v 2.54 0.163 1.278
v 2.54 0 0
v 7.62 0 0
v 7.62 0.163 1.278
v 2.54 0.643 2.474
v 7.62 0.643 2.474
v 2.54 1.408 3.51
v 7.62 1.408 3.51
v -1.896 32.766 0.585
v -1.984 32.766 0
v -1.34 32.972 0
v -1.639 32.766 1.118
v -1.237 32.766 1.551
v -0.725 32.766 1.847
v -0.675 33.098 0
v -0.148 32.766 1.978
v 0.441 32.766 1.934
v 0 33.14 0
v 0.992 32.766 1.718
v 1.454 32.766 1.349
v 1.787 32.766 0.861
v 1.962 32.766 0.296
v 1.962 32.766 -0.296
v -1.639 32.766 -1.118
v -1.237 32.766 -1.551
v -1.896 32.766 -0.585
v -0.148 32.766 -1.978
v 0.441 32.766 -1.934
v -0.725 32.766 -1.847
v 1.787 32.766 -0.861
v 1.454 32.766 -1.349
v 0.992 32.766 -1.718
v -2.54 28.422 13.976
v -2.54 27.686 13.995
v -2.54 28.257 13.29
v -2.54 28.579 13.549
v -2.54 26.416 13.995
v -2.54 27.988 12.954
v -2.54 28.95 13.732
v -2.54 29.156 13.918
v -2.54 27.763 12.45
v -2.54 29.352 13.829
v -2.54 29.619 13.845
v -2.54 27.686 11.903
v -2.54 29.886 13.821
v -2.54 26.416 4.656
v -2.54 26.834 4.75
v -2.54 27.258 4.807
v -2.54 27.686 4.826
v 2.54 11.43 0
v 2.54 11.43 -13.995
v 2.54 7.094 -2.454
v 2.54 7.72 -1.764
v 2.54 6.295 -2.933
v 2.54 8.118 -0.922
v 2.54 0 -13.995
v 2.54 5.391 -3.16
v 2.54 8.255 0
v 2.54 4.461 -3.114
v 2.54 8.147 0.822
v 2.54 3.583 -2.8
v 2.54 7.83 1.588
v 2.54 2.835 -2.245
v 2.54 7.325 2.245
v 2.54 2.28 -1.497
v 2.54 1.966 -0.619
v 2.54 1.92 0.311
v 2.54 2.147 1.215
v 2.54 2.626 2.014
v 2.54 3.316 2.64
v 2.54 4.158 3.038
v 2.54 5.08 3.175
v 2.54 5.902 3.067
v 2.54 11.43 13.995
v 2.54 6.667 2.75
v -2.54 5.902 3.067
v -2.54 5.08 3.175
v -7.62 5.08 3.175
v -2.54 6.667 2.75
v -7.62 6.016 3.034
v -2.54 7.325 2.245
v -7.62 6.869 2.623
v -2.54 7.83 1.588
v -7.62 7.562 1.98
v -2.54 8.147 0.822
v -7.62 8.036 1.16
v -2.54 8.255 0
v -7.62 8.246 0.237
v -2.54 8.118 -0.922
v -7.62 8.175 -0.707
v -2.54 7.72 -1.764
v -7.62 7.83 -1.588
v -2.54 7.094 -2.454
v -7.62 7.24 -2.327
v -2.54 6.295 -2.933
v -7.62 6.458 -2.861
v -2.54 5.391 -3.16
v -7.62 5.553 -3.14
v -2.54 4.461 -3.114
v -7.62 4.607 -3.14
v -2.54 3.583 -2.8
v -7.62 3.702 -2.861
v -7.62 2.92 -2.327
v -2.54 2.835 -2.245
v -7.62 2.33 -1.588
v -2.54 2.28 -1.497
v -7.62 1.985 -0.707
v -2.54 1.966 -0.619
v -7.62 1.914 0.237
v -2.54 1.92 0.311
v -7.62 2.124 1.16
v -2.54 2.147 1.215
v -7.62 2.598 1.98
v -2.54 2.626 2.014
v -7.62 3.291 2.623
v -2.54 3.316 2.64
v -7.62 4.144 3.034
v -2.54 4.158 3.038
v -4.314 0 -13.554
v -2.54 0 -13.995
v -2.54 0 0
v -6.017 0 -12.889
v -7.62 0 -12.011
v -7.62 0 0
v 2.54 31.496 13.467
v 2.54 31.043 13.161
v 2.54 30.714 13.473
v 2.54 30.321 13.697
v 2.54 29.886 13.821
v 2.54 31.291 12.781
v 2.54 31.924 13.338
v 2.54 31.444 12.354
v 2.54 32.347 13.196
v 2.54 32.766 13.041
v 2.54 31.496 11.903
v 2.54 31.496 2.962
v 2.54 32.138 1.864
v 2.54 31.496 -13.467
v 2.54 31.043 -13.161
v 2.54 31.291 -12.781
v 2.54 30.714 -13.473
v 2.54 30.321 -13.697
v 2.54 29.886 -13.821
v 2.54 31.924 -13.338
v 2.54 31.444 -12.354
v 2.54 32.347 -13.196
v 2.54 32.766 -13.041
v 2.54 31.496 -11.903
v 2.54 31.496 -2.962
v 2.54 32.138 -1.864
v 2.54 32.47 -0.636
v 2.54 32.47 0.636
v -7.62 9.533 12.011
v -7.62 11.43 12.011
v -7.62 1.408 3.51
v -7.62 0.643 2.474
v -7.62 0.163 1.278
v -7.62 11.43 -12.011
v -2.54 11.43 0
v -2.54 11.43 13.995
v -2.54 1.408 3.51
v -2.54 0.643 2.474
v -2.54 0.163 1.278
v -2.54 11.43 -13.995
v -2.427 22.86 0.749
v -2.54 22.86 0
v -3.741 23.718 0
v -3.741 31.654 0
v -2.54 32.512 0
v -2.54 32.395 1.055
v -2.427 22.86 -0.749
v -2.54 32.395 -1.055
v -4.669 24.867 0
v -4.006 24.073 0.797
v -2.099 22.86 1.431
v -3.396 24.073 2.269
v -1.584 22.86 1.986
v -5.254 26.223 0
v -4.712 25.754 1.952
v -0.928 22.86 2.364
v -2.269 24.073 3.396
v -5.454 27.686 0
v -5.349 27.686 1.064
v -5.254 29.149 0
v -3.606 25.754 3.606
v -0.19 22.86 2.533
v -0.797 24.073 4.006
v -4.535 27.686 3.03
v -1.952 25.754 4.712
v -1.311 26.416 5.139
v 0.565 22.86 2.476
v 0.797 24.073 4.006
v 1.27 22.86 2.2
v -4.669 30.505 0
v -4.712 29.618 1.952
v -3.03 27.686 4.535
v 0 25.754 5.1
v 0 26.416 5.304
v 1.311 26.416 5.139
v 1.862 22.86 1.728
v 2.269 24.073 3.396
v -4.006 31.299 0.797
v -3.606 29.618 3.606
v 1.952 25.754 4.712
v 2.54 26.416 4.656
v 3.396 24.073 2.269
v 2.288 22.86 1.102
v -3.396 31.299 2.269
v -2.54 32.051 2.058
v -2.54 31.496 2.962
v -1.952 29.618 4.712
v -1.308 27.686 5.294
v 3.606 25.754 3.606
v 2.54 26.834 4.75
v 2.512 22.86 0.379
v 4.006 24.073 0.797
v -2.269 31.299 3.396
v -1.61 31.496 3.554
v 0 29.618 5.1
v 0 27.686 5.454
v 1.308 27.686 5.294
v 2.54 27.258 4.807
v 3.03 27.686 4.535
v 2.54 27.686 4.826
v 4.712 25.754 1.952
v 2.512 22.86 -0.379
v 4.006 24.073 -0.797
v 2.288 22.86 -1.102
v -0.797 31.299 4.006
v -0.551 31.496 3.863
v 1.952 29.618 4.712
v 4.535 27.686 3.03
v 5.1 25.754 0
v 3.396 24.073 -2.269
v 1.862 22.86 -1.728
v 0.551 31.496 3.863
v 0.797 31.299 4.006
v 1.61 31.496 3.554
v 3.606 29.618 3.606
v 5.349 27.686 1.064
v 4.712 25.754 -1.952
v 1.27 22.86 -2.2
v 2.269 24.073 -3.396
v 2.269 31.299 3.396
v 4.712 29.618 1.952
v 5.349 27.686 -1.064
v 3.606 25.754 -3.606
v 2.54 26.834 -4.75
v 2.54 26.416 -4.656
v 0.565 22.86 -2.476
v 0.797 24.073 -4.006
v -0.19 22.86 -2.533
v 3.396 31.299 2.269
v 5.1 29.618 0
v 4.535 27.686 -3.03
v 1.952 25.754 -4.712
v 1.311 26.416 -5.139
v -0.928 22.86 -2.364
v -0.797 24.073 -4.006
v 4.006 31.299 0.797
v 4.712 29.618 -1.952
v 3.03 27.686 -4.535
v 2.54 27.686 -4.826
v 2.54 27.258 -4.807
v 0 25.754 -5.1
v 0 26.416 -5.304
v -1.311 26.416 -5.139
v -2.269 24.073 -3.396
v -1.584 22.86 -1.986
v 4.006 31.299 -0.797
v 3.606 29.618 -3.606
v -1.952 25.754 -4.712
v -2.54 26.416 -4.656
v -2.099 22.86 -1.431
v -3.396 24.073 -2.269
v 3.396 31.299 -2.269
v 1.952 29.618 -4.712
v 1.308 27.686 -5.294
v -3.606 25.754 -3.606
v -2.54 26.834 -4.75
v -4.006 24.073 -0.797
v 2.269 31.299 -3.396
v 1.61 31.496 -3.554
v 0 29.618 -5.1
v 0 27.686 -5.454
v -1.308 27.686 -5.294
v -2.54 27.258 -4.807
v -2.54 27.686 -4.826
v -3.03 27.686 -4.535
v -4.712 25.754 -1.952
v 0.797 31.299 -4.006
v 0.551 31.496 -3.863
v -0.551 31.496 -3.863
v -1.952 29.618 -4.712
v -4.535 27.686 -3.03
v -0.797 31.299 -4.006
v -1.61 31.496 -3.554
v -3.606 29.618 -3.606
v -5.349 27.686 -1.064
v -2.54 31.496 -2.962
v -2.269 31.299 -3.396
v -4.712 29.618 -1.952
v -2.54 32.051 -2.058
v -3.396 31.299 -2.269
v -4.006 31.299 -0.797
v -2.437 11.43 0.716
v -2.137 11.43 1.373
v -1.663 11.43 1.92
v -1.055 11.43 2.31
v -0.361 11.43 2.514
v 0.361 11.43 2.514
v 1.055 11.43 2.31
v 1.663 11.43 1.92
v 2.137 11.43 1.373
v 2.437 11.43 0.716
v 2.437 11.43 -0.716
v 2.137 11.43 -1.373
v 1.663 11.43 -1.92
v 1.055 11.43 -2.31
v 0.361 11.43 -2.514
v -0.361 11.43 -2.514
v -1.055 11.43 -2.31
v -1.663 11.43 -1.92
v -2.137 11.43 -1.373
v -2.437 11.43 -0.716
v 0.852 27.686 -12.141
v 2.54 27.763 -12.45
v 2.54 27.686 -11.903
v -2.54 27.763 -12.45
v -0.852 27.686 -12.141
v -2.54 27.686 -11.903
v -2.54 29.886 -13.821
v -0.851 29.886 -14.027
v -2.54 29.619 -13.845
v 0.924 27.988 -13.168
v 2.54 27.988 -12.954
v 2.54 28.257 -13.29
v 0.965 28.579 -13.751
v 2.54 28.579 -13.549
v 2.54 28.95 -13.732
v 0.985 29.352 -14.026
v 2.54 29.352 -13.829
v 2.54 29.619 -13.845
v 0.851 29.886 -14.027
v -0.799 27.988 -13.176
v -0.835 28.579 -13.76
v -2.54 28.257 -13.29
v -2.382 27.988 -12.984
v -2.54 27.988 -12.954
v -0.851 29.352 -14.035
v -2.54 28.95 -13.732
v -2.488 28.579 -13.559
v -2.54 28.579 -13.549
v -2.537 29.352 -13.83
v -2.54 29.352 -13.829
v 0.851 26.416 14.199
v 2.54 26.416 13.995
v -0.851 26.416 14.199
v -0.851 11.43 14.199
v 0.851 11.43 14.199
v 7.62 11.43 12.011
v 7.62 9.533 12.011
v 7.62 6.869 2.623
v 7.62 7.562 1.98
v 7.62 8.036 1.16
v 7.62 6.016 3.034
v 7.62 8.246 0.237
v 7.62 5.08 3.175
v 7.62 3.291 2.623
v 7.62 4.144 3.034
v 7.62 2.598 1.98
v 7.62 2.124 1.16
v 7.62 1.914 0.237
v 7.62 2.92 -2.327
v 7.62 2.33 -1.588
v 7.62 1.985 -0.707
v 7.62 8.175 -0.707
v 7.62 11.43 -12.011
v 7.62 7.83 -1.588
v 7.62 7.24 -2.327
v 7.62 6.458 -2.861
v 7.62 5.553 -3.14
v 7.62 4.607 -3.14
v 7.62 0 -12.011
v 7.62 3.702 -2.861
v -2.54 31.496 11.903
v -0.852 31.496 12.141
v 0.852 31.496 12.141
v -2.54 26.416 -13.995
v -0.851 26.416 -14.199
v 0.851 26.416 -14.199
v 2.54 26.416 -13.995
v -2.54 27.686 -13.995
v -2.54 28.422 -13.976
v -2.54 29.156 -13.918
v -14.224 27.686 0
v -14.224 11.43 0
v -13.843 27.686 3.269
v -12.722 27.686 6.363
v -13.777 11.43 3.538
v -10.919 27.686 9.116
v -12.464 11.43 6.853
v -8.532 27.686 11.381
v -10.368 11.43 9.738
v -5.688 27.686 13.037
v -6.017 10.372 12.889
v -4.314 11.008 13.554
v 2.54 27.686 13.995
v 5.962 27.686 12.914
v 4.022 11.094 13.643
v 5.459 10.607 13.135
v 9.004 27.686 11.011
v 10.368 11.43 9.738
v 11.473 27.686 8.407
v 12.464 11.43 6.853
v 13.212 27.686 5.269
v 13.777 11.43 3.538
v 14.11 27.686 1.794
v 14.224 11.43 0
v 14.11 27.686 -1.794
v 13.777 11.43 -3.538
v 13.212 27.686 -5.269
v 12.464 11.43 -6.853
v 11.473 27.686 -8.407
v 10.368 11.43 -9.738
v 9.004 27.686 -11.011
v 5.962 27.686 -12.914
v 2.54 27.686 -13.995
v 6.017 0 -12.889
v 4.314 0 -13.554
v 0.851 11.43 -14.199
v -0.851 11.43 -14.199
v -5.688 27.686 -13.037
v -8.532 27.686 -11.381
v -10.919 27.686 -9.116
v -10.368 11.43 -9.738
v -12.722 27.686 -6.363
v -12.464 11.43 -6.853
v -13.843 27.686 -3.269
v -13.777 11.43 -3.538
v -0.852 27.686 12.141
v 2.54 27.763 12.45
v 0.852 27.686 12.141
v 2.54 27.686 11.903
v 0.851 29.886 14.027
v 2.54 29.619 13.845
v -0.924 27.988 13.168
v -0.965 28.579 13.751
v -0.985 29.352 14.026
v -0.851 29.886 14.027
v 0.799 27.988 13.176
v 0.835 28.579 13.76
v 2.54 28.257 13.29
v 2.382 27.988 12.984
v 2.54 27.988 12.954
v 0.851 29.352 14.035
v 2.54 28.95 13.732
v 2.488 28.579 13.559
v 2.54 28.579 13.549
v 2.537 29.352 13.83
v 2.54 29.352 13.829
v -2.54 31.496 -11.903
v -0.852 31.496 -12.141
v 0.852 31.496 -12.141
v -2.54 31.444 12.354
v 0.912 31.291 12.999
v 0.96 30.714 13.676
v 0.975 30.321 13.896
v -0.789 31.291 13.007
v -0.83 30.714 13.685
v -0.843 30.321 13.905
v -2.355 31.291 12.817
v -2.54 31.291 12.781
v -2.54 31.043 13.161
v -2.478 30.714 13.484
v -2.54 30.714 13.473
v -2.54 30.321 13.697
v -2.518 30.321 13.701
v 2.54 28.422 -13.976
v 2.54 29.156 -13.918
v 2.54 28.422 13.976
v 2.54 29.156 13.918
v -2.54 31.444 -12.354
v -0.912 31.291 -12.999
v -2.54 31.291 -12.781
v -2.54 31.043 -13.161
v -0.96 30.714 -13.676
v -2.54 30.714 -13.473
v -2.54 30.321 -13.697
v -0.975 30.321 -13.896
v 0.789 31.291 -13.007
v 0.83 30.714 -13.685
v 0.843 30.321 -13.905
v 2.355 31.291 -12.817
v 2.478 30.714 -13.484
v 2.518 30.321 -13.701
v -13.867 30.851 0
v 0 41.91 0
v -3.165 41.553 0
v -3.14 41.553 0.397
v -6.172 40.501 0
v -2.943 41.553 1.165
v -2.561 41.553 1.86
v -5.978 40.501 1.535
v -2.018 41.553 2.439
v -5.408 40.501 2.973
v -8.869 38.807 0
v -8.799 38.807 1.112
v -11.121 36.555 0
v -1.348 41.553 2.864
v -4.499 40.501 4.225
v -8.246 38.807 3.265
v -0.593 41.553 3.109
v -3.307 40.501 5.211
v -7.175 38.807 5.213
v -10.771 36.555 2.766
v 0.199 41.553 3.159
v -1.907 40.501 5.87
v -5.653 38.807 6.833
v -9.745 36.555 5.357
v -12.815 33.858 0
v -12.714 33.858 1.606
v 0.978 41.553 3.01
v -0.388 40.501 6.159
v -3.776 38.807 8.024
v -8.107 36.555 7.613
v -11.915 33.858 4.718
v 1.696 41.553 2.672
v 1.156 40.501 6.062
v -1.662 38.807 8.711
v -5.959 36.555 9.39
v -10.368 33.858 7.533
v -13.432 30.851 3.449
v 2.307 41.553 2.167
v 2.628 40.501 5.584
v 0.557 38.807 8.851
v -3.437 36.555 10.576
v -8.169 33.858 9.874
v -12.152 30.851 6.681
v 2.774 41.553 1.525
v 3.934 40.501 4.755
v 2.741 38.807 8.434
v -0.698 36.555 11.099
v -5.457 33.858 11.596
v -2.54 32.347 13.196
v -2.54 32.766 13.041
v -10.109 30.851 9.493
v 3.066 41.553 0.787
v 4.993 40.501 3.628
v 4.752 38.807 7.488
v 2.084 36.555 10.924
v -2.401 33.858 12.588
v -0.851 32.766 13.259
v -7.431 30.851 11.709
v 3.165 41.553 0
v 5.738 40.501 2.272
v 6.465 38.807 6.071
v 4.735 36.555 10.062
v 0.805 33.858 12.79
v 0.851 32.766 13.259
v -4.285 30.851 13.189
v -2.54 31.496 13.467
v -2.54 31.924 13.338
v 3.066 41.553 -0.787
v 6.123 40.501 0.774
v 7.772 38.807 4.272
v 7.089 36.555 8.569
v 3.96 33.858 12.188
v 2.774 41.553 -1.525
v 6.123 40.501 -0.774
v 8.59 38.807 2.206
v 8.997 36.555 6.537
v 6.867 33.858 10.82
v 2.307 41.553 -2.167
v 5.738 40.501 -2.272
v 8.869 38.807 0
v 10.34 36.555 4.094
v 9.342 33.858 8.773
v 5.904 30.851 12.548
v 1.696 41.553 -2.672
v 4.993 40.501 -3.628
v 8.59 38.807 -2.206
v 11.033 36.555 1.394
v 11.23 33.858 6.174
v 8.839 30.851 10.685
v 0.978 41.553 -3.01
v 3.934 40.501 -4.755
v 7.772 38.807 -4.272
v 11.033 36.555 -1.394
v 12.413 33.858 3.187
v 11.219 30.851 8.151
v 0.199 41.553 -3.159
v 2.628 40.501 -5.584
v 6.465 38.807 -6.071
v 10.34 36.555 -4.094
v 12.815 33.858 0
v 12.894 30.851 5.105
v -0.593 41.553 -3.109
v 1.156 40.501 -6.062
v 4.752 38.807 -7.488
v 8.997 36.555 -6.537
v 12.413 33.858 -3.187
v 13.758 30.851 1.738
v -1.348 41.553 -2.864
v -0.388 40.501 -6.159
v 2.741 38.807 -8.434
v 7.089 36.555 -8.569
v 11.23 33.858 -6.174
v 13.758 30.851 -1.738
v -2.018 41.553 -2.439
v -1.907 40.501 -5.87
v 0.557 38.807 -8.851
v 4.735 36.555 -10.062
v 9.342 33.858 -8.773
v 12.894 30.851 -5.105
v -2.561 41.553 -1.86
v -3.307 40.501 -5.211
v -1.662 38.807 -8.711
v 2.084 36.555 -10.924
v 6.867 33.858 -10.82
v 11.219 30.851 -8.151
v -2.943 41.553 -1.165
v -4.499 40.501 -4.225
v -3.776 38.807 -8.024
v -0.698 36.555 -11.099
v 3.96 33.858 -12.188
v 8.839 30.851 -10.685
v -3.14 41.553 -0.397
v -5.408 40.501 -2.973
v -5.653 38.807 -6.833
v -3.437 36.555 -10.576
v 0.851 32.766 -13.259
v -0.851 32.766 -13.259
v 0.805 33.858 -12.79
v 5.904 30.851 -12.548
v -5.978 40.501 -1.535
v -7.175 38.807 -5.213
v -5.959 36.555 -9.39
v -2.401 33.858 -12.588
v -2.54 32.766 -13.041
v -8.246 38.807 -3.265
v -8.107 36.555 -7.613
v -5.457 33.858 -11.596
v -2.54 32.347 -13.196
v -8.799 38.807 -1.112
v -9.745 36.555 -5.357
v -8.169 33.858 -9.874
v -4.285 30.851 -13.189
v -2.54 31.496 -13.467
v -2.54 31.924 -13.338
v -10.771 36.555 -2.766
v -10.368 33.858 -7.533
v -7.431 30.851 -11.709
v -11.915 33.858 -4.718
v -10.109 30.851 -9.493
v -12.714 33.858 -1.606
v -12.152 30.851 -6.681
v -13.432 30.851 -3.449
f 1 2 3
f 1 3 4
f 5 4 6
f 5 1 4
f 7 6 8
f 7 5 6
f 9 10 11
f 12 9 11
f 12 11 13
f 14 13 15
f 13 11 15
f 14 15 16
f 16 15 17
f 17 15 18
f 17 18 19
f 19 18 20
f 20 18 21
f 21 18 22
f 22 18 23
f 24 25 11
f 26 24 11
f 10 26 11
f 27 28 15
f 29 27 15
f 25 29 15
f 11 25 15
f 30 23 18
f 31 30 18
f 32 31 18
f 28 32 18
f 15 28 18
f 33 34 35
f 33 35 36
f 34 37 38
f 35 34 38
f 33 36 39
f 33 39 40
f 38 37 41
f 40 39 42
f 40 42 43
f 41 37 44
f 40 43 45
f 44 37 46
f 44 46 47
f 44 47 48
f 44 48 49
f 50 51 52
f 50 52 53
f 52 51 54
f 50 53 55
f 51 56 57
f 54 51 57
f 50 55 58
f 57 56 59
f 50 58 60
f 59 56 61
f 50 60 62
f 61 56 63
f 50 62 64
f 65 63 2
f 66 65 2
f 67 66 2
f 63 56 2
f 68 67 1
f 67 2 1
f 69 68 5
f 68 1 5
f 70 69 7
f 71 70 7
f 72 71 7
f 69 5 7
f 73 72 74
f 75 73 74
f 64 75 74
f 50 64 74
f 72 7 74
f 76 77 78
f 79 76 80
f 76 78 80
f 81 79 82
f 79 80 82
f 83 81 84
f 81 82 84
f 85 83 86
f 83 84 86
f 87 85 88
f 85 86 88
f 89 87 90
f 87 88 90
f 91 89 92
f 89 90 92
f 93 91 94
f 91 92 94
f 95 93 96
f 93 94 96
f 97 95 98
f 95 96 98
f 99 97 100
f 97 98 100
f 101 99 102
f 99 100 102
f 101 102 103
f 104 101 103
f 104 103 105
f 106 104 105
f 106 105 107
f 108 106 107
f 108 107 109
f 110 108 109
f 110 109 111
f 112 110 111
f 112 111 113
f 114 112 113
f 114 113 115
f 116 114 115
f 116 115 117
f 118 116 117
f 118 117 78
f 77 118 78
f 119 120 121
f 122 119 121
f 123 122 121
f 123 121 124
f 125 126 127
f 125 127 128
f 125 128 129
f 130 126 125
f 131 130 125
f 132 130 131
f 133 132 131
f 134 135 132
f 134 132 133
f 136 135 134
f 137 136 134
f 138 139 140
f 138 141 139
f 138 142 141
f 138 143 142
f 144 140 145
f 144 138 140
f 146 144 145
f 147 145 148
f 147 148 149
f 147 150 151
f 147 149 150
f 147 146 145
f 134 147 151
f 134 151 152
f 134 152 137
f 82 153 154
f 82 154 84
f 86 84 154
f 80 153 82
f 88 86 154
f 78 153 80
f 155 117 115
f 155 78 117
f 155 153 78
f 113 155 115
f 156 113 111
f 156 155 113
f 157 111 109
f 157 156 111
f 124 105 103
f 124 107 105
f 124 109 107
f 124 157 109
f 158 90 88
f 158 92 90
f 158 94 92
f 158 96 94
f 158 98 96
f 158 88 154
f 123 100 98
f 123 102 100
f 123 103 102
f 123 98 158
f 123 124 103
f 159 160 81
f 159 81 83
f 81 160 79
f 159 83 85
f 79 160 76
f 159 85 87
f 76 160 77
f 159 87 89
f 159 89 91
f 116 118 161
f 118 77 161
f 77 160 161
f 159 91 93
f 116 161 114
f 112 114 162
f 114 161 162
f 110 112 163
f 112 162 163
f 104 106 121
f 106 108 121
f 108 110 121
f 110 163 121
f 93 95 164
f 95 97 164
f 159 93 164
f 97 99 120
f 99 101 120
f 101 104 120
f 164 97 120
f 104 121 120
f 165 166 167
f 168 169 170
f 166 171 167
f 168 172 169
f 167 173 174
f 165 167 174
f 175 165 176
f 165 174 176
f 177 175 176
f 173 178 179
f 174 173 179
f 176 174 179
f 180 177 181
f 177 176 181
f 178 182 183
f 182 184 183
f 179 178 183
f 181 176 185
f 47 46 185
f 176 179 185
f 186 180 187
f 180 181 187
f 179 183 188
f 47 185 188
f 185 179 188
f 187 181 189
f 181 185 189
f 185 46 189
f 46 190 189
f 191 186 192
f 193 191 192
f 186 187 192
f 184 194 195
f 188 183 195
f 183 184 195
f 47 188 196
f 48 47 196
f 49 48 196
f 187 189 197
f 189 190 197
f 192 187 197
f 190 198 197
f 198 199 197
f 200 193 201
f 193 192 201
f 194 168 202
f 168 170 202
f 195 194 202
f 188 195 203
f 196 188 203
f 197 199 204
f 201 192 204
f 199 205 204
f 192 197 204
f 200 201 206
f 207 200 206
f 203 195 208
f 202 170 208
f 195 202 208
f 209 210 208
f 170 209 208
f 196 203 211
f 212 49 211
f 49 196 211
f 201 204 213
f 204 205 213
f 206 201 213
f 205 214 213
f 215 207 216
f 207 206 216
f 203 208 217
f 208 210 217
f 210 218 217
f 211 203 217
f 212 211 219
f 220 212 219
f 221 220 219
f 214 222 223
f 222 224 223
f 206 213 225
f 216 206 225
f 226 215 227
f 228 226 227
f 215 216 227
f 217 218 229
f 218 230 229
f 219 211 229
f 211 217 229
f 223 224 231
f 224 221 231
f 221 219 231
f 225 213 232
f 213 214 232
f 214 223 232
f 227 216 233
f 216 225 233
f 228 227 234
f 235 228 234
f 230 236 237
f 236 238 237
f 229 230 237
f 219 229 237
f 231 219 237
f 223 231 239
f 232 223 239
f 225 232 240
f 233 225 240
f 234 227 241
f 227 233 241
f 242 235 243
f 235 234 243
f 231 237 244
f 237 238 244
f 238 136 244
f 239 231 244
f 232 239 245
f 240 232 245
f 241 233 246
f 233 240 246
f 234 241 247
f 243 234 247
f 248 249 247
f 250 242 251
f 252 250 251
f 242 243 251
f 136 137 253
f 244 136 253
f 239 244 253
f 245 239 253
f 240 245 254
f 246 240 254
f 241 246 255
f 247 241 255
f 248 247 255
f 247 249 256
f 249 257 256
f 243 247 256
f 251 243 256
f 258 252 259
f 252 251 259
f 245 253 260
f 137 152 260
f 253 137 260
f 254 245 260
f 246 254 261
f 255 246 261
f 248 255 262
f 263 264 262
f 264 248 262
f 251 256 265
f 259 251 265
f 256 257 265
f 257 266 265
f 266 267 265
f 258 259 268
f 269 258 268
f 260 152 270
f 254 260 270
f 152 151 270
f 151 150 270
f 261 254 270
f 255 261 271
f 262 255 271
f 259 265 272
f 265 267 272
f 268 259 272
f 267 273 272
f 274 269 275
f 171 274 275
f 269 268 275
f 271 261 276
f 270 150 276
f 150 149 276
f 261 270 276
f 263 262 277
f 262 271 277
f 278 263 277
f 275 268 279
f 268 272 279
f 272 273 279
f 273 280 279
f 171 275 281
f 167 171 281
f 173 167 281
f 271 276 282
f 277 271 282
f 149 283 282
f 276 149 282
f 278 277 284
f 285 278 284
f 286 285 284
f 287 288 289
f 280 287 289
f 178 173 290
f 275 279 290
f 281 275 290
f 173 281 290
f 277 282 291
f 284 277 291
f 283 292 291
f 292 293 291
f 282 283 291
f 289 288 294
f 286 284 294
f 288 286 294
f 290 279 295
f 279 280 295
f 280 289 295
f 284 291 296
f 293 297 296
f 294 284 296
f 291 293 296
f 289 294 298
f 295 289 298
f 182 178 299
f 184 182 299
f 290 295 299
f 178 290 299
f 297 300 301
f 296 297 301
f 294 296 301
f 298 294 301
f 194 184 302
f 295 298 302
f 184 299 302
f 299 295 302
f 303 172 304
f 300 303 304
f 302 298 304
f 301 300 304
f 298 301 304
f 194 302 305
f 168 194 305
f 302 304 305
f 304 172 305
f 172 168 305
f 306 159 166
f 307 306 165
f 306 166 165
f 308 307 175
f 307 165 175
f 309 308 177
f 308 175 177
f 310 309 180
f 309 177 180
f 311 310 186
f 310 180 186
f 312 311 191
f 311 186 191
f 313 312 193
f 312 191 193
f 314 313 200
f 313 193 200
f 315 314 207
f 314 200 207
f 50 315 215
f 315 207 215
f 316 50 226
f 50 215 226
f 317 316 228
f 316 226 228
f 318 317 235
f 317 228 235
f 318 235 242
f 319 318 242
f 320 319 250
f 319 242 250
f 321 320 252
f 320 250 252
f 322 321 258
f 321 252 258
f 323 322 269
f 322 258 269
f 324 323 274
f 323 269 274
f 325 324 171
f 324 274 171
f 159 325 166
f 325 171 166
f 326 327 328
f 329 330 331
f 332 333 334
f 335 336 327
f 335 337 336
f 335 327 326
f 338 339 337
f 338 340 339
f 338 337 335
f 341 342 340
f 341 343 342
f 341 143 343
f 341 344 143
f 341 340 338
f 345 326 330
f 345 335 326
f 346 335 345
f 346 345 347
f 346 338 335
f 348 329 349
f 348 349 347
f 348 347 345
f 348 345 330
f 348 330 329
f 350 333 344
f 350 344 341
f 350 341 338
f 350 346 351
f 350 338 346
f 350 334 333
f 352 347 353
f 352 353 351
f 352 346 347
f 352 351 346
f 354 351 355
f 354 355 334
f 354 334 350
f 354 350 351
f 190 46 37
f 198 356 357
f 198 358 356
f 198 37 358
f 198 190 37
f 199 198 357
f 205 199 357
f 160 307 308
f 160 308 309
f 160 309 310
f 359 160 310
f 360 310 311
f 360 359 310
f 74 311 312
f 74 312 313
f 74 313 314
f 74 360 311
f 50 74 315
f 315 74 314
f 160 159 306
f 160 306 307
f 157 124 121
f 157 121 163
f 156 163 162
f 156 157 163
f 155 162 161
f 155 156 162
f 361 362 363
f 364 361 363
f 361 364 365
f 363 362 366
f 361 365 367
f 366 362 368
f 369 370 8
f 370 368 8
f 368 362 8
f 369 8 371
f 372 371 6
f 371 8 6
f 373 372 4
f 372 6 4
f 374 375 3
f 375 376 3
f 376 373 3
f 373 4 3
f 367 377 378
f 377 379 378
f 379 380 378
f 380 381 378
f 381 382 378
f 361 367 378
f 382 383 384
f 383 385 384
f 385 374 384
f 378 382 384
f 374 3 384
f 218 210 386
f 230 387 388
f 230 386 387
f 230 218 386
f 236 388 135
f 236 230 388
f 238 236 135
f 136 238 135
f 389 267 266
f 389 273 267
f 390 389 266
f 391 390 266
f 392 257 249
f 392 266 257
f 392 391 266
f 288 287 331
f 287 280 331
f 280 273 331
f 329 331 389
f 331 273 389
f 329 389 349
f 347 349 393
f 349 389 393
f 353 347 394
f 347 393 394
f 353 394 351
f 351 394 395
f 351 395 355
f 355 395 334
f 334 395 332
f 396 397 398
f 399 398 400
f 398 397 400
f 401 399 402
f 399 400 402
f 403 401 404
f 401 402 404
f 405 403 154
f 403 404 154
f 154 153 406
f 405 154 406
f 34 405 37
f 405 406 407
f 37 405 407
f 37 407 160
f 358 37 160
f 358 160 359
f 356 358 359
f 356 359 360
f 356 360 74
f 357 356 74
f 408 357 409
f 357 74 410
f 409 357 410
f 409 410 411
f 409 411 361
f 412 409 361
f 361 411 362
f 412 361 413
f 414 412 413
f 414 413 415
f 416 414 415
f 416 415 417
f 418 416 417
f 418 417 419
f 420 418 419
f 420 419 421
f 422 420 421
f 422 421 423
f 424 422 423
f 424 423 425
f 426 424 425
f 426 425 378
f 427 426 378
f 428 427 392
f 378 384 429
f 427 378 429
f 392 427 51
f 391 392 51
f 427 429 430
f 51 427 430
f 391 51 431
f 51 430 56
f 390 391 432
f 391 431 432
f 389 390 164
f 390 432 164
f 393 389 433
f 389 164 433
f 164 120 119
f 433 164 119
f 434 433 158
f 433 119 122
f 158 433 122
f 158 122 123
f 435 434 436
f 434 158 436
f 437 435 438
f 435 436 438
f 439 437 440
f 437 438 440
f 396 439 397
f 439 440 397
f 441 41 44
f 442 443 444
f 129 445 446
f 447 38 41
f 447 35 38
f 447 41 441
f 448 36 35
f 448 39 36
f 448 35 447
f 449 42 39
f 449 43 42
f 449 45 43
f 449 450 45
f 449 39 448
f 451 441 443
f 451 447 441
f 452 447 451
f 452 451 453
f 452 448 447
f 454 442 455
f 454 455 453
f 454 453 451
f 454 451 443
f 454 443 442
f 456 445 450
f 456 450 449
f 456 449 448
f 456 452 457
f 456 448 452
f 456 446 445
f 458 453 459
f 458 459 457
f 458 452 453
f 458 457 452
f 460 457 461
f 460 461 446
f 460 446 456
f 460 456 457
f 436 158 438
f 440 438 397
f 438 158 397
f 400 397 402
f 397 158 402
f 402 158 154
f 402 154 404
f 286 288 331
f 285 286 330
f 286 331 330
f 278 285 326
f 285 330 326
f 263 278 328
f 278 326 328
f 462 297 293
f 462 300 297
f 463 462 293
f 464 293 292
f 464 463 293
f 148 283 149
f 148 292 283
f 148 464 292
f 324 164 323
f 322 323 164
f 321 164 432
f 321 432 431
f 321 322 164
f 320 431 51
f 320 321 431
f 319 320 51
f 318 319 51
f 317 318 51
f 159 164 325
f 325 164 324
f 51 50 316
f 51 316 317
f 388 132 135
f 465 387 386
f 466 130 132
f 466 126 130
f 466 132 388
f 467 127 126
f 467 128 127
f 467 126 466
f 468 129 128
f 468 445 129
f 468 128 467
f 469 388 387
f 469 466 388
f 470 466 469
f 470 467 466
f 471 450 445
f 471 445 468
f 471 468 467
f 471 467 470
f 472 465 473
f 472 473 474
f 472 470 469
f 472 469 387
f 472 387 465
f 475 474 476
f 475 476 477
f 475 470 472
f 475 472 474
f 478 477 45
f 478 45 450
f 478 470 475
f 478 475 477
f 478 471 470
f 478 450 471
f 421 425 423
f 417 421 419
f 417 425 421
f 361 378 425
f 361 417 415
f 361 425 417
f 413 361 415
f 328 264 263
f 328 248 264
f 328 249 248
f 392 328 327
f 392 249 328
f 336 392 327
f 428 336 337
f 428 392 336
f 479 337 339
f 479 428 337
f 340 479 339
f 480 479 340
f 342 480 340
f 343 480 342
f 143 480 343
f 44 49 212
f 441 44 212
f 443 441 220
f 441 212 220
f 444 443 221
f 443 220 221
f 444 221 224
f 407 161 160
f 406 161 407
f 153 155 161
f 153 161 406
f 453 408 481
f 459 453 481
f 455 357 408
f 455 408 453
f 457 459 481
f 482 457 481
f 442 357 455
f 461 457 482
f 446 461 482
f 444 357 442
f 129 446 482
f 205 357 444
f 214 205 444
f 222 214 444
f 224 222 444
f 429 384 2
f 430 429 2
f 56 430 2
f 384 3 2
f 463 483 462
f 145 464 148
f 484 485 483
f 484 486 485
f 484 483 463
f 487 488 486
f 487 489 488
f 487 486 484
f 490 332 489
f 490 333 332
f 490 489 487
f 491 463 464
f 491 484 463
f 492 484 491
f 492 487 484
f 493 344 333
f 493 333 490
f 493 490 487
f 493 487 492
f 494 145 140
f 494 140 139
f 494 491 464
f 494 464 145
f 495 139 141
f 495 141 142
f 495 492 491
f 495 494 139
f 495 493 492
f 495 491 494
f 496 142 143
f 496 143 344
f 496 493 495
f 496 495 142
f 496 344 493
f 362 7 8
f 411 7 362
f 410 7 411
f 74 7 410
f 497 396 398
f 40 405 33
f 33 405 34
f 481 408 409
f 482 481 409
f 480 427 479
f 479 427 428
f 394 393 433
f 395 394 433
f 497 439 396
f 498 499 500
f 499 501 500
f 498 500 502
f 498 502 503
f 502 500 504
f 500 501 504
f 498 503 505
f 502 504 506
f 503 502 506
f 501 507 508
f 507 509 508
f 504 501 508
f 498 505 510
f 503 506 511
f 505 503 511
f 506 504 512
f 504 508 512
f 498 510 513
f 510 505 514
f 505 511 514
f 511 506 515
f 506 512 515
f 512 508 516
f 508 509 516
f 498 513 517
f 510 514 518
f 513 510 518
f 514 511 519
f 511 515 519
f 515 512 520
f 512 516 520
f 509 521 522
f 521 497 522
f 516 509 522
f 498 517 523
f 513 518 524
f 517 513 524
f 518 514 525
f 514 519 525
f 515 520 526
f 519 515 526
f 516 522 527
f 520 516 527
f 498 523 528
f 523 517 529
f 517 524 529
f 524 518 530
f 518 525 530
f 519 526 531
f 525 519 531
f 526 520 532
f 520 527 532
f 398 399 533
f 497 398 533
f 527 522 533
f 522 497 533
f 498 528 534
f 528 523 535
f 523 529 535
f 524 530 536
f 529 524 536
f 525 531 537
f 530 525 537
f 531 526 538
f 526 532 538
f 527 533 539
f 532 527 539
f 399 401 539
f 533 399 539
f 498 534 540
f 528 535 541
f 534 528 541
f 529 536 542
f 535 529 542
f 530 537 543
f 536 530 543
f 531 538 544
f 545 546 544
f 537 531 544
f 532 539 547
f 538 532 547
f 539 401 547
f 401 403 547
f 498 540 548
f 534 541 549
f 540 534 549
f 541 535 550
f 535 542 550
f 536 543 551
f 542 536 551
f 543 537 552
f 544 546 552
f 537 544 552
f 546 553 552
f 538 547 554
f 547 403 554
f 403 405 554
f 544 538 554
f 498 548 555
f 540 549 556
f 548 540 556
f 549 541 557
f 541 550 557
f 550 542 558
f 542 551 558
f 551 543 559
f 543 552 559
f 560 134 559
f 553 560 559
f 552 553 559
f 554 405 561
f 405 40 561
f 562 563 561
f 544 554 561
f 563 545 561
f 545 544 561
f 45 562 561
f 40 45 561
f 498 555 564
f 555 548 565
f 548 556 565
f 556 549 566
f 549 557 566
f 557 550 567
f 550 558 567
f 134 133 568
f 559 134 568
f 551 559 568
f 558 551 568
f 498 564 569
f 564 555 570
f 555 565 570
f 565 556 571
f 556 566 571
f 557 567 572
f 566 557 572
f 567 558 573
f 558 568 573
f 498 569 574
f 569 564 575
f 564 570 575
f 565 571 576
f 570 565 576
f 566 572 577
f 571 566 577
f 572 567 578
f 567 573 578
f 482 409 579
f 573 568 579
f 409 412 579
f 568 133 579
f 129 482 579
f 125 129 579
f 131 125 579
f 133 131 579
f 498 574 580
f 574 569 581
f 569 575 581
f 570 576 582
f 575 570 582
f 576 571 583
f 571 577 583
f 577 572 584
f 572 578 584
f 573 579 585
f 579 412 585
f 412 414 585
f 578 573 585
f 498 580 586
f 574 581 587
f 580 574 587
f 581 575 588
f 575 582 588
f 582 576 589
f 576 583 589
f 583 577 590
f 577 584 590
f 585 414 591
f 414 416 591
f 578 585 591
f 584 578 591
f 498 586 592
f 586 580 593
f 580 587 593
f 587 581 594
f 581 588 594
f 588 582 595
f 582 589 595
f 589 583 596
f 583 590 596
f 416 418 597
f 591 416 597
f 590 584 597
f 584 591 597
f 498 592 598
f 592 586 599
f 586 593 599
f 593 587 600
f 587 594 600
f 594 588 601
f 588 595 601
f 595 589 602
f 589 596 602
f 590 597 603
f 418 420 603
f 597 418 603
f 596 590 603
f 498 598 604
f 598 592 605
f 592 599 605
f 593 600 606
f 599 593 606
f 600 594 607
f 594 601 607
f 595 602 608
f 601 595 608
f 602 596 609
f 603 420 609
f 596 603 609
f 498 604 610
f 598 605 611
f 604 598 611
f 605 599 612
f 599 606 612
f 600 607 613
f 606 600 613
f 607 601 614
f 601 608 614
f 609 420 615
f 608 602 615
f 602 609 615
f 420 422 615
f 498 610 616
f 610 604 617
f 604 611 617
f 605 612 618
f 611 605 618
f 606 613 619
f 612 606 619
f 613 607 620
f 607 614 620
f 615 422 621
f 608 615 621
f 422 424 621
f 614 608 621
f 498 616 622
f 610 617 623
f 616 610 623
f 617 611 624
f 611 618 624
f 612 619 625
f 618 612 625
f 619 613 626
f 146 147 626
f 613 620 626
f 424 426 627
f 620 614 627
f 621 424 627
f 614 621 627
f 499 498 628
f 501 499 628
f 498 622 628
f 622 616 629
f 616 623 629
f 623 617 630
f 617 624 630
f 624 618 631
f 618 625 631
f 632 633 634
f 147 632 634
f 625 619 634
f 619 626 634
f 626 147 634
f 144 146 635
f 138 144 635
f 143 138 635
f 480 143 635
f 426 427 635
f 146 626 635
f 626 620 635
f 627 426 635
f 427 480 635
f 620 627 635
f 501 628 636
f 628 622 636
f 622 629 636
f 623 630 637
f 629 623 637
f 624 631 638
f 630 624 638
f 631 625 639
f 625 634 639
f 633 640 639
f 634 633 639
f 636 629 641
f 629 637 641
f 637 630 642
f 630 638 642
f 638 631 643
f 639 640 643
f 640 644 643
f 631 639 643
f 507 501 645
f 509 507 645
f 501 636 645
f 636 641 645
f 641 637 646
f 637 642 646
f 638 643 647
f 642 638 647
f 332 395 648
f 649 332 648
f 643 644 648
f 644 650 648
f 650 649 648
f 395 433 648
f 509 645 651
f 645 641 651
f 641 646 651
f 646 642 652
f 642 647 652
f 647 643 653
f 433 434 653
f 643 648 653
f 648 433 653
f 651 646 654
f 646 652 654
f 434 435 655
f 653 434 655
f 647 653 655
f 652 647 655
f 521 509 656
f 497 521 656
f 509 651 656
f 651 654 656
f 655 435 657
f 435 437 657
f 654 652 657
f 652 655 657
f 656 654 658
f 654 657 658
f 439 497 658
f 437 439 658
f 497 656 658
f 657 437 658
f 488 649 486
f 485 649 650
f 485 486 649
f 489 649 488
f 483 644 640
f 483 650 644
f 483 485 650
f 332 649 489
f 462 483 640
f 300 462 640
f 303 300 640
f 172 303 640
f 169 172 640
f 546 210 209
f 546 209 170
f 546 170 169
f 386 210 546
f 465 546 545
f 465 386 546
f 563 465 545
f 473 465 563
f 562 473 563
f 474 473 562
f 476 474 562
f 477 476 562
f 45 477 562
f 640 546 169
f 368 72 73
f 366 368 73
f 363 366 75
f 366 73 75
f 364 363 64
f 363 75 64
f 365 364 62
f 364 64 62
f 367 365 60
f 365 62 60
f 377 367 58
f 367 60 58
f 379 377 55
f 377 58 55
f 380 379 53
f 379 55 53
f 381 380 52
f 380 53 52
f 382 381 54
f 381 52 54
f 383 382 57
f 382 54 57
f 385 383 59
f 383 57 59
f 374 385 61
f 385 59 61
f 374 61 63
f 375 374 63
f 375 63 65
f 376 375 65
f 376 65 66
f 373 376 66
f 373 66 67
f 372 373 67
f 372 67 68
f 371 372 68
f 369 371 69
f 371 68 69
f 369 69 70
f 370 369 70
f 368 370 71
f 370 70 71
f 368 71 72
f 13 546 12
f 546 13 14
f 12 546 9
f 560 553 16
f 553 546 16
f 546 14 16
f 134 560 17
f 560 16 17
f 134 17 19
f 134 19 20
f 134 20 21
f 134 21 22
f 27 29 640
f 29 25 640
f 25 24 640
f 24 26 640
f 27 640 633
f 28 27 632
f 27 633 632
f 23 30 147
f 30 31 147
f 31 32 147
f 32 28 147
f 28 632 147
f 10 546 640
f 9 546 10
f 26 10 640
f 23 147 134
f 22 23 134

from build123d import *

# Parameters (mm, degrees)
CUT_EXTRUDE1_DEPTH      = 11.43
SKETCH3_R               = 3.175
CUT_EXTRUDE2_DEPTH      = 50.355147776
CUT_EXTRUDE3_DEPTH      = 47.487551581
CUT_EXTRUDE3_DEPTH_BACK = 47.487551581
SKETCH4_W               = 5.08
SKETCH4_H               = 1.27
FILLET1_R               = 1.905


with BuildPart() as part:
    # Sketch1 → Revolve1 (revolve)
    with BuildSketch(Plane.XY):
        with BuildLine():
            Line((0, 0), (0, 5.602635041))
            Line((0, 5.602635041), (-2.54, 5.602635041))
            Line((-2.54, 5.602635041), (-2.54, 22.86))
            ThreePointArc((-2.54, 22.86), (-5.294384008, 28.994194932), (0, 33.139611281))
            Line((0, 33.139611281), (0, 41.91))
            ThreePointArc((0, 41.91), (-10.057886856, 37.743886856), (-14.224, 27.686))
            Line((-14.224, 27.686), (-14.224, 0))
            Line((-14.224, 0), (0, 0))
        make_face()
    revolve(axis=Axis((0, 0, 0), (0, 1, 0)))

    # Sketch2 → Cut-Extrude1 (cut)
    with BuildSketch(Plane.XZ):
        with BuildLine():
            Line((-2.54, 13.995376951), (-2.54, -13.995376951))
            ThreePointArc((-2.54, -13.995376951), (0, -14.224), (2.54, -13.995376951))
            Line((2.54, -13.995376951), (2.54, 13.995376951))
            ThreePointArc((2.54, 13.995376951), (0, 14.224), (-2.54, 13.995376951))
        make_face()
        with BuildLine():
            Line((-7.62, 12.010735864), (-7.62, -12.010735864))
            ThreePointArc((-7.62, -12.010735864), (-14.224, 0), (-7.62, 12.010735864))
        make_face()
        with BuildLine():
            Line((7.62, 12.010735864), (7.62, -12.010735864))
            ThreePointArc((7.62, -12.010735864), (14.224, 0), (7.62, 12.010735864))
        make_face()
    extrude(amount=-CUT_EXTRUDE1_DEPTH, mode=Mode.SUBTRACT)

    # Sketch3 → Cut-Extrude2 (cut, through all)
    with BuildSketch(Plane.ZY.offset(7.62)):
        with Locations((0, 5.08)):
            Circle(SKETCH3_R)
        with BuildLine():
            Line((3.510108408, 1.40773381), (13.995376951, 11.43))
            Line((13.995376951, 11.43), (13.995376951, 0))
            Line((13.995376951, 0), (0, 0))
            ThreePointArc((0, 0), (1.890937302, 0.365049722), (3.510108408, 1.40773381))
        make_face()
    extrude(amount=-CUT_EXTRUDE2_DEPTH, mode=Mode.SUBTRACT)

    # Sketch4 → Cut-Extrude3 (cut, two sides: drawn at the far end of the back side and taken through both)
    with BuildSketch(Plane.XY.offset(-CUT_EXTRUDE3_DEPTH_BACK)):
        with Locations((0, 27.051)):
            Rectangle(SKETCH4_W, SKETCH4_H)
        with Locations((0, 32.131)):
            Rectangle(SKETCH4_W, SKETCH4_H)
    extrude(amount=CUT_EXTRUDE3_DEPTH + CUT_EXTRUDE3_DEPTH_BACK, mode=Mode.SUBTRACT)

    # Fillet1
    # the kernel refuses this fillet: 1.905 mm, written as the material it takes off along each edge
    with BuildSketch(Plane(origin=(0, 27.686, 0), x_dir=(-0.5373639456593198, 0, 0.8433504549743527), z_dir=(-0.8433504549743527, 0, -0.5373639456593198))) as fillet1_piece_1_section:
        with BuildLine():
            CenterArc((12.170814928, 1.905), FILLET1_R, 270, 98.895870208)
            Line((12.170814928, 0), (14.224, 0))
            ThreePointArc((14.224, 0), (14.181160416, 1.10311616), (14.05289971, 2.199587629))
        make_face()
    fillet1_piece_1 = revolve(axis=Axis((0, 27.686, 0), (0, 1, 0)), revolution_arc=65.00874172, mode=Mode.PRIVATE)
    fillet1_piece_1 = split(fillet1_piece_1, bisect_by=Plane(origin=(2.54, 28.192059722, 13.665836287), z_dir=(-1, 0, 0)), keep=Keep.TOP, mode=Mode.PRIVATE)
    fillet1_piece_1 = split(fillet1_piece_1, bisect_by=Plane(origin=(-2.54, 28.192059722, 13.665836287), z_dir=(1, 0, 0)), keep=Keep.TOP, mode=Mode.PRIVATE)
    add(fillet1_piece_1, mode=Mode.SUBTRACT)
    with BuildSketch(Plane(origin=(0, 31.496, 0), x_dir=(0.46799048823775274, 0, 0.883733502204703), z_dir=(0.883733502204703, 0, -0.46799048823775274))) as fillet1_piece_2_section:
        with BuildLine():
            CenterArc((12.170814928, 1.905), FILLET1_R, 270, 81.104129792)
            Line((12.170814928, 0), (13.704235696, 0))
            ThreePointArc((13.704235696, 0), (13.90190629, 0.80015324), (14.05289971, 1.610412371))
        make_face()
    fillet1_piece_2 = revolve(axis=Axis((0, 31.496, 0), (0, -1, 0)), revolution_arc=55.807867303, mode=Mode.PRIVATE)
    fillet1_piece_2 = split(fillet1_piece_2, bisect_by=Plane(origin=(-2.54, 31.138166145, 13.379180575), z_dir=(1, 0, 0)), keep=Keep.TOP, mode=Mode.PRIVATE)
    fillet1_piece_2 = split(fillet1_piece_2, bisect_by=Plane(origin=(2.54, 31.138166145, 13.379180575), z_dir=(-1, 0, 0)), keep=Keep.TOP, mode=Mode.PRIVATE)
    add(fillet1_piece_2, mode=Mode.SUBTRACT)
    with BuildSketch(Plane(origin=(0, 31.496, 0), x_dir=(-0.4679904882377507, 0, -0.883733502204704), z_dir=(-0.883733502204704, 0, 0.4679904882377507))) as fillet1_piece_3_section:
        with BuildLine():
            CenterArc((12.170814928, 1.905), FILLET1_R, 270, 81.104129792)
            Line((12.170814928, 0), (13.704235696, 0))
            ThreePointArc((13.704235696, 0), (13.90190629, 0.80015324), (14.05289971, 1.610412371))
        make_face()
    fillet1_piece_3 = revolve(axis=Axis((0, 31.496, 0), (0, -1, 0)), revolution_arc=55.807867303, mode=Mode.PRIVATE)
    fillet1_piece_3 = split(fillet1_piece_3, bisect_by=Plane(origin=(-2.54, 31.138166145, -13.379180575), z_dir=(1, 0, 0)), keep=Keep.TOP, mode=Mode.PRIVATE)
    fillet1_piece_3 = split(fillet1_piece_3, bisect_by=Plane(origin=(2.54, 31.138166145, -13.379180575), z_dir=(-1, 0, 0)), keep=Keep.TOP, mode=Mode.PRIVATE)
    add(fillet1_piece_3, mode=Mode.SUBTRACT)
    with BuildSketch(Plane(origin=(0, 27.686, 0), x_dir=(0.5373639456593708, 0, -0.84335045497432), z_dir=(0.84335045497432, 0, 0.5373639456593708))) as fillet1_piece_4_section:
        with BuildLine():
            CenterArc((12.170814928, 1.905), FILLET1_R, 270, 98.895870208)
            Line((12.170814928, 0), (14.224, 0))
            ThreePointArc((14.224, 0), (14.181160416, 1.10311616), (14.05289971, 2.199587629))
        make_face()
    fillet1_piece_4 = revolve(axis=Axis((0, 27.686, 0), (0, 1, 0)), revolution_arc=65.00874172, mode=Mode.PRIVATE)
    fillet1_piece_4 = split(fillet1_piece_4, bisect_by=Plane(origin=(-2.54, 28.192059722, -13.665836287), z_dir=(1, 0, 0)), keep=Keep.TOP, mode=Mode.PRIVATE)
    fillet1_piece_4 = split(fillet1_piece_4, bisect_by=Plane(origin=(2.54, 28.192059722, -13.665836287), z_dir=(-1, 0, 0)), keep=Keep.TOP, mode=Mode.PRIVATE)
    add(fillet1_piece_4, mode=Mode.SUBTRACT)


solid = part.part
